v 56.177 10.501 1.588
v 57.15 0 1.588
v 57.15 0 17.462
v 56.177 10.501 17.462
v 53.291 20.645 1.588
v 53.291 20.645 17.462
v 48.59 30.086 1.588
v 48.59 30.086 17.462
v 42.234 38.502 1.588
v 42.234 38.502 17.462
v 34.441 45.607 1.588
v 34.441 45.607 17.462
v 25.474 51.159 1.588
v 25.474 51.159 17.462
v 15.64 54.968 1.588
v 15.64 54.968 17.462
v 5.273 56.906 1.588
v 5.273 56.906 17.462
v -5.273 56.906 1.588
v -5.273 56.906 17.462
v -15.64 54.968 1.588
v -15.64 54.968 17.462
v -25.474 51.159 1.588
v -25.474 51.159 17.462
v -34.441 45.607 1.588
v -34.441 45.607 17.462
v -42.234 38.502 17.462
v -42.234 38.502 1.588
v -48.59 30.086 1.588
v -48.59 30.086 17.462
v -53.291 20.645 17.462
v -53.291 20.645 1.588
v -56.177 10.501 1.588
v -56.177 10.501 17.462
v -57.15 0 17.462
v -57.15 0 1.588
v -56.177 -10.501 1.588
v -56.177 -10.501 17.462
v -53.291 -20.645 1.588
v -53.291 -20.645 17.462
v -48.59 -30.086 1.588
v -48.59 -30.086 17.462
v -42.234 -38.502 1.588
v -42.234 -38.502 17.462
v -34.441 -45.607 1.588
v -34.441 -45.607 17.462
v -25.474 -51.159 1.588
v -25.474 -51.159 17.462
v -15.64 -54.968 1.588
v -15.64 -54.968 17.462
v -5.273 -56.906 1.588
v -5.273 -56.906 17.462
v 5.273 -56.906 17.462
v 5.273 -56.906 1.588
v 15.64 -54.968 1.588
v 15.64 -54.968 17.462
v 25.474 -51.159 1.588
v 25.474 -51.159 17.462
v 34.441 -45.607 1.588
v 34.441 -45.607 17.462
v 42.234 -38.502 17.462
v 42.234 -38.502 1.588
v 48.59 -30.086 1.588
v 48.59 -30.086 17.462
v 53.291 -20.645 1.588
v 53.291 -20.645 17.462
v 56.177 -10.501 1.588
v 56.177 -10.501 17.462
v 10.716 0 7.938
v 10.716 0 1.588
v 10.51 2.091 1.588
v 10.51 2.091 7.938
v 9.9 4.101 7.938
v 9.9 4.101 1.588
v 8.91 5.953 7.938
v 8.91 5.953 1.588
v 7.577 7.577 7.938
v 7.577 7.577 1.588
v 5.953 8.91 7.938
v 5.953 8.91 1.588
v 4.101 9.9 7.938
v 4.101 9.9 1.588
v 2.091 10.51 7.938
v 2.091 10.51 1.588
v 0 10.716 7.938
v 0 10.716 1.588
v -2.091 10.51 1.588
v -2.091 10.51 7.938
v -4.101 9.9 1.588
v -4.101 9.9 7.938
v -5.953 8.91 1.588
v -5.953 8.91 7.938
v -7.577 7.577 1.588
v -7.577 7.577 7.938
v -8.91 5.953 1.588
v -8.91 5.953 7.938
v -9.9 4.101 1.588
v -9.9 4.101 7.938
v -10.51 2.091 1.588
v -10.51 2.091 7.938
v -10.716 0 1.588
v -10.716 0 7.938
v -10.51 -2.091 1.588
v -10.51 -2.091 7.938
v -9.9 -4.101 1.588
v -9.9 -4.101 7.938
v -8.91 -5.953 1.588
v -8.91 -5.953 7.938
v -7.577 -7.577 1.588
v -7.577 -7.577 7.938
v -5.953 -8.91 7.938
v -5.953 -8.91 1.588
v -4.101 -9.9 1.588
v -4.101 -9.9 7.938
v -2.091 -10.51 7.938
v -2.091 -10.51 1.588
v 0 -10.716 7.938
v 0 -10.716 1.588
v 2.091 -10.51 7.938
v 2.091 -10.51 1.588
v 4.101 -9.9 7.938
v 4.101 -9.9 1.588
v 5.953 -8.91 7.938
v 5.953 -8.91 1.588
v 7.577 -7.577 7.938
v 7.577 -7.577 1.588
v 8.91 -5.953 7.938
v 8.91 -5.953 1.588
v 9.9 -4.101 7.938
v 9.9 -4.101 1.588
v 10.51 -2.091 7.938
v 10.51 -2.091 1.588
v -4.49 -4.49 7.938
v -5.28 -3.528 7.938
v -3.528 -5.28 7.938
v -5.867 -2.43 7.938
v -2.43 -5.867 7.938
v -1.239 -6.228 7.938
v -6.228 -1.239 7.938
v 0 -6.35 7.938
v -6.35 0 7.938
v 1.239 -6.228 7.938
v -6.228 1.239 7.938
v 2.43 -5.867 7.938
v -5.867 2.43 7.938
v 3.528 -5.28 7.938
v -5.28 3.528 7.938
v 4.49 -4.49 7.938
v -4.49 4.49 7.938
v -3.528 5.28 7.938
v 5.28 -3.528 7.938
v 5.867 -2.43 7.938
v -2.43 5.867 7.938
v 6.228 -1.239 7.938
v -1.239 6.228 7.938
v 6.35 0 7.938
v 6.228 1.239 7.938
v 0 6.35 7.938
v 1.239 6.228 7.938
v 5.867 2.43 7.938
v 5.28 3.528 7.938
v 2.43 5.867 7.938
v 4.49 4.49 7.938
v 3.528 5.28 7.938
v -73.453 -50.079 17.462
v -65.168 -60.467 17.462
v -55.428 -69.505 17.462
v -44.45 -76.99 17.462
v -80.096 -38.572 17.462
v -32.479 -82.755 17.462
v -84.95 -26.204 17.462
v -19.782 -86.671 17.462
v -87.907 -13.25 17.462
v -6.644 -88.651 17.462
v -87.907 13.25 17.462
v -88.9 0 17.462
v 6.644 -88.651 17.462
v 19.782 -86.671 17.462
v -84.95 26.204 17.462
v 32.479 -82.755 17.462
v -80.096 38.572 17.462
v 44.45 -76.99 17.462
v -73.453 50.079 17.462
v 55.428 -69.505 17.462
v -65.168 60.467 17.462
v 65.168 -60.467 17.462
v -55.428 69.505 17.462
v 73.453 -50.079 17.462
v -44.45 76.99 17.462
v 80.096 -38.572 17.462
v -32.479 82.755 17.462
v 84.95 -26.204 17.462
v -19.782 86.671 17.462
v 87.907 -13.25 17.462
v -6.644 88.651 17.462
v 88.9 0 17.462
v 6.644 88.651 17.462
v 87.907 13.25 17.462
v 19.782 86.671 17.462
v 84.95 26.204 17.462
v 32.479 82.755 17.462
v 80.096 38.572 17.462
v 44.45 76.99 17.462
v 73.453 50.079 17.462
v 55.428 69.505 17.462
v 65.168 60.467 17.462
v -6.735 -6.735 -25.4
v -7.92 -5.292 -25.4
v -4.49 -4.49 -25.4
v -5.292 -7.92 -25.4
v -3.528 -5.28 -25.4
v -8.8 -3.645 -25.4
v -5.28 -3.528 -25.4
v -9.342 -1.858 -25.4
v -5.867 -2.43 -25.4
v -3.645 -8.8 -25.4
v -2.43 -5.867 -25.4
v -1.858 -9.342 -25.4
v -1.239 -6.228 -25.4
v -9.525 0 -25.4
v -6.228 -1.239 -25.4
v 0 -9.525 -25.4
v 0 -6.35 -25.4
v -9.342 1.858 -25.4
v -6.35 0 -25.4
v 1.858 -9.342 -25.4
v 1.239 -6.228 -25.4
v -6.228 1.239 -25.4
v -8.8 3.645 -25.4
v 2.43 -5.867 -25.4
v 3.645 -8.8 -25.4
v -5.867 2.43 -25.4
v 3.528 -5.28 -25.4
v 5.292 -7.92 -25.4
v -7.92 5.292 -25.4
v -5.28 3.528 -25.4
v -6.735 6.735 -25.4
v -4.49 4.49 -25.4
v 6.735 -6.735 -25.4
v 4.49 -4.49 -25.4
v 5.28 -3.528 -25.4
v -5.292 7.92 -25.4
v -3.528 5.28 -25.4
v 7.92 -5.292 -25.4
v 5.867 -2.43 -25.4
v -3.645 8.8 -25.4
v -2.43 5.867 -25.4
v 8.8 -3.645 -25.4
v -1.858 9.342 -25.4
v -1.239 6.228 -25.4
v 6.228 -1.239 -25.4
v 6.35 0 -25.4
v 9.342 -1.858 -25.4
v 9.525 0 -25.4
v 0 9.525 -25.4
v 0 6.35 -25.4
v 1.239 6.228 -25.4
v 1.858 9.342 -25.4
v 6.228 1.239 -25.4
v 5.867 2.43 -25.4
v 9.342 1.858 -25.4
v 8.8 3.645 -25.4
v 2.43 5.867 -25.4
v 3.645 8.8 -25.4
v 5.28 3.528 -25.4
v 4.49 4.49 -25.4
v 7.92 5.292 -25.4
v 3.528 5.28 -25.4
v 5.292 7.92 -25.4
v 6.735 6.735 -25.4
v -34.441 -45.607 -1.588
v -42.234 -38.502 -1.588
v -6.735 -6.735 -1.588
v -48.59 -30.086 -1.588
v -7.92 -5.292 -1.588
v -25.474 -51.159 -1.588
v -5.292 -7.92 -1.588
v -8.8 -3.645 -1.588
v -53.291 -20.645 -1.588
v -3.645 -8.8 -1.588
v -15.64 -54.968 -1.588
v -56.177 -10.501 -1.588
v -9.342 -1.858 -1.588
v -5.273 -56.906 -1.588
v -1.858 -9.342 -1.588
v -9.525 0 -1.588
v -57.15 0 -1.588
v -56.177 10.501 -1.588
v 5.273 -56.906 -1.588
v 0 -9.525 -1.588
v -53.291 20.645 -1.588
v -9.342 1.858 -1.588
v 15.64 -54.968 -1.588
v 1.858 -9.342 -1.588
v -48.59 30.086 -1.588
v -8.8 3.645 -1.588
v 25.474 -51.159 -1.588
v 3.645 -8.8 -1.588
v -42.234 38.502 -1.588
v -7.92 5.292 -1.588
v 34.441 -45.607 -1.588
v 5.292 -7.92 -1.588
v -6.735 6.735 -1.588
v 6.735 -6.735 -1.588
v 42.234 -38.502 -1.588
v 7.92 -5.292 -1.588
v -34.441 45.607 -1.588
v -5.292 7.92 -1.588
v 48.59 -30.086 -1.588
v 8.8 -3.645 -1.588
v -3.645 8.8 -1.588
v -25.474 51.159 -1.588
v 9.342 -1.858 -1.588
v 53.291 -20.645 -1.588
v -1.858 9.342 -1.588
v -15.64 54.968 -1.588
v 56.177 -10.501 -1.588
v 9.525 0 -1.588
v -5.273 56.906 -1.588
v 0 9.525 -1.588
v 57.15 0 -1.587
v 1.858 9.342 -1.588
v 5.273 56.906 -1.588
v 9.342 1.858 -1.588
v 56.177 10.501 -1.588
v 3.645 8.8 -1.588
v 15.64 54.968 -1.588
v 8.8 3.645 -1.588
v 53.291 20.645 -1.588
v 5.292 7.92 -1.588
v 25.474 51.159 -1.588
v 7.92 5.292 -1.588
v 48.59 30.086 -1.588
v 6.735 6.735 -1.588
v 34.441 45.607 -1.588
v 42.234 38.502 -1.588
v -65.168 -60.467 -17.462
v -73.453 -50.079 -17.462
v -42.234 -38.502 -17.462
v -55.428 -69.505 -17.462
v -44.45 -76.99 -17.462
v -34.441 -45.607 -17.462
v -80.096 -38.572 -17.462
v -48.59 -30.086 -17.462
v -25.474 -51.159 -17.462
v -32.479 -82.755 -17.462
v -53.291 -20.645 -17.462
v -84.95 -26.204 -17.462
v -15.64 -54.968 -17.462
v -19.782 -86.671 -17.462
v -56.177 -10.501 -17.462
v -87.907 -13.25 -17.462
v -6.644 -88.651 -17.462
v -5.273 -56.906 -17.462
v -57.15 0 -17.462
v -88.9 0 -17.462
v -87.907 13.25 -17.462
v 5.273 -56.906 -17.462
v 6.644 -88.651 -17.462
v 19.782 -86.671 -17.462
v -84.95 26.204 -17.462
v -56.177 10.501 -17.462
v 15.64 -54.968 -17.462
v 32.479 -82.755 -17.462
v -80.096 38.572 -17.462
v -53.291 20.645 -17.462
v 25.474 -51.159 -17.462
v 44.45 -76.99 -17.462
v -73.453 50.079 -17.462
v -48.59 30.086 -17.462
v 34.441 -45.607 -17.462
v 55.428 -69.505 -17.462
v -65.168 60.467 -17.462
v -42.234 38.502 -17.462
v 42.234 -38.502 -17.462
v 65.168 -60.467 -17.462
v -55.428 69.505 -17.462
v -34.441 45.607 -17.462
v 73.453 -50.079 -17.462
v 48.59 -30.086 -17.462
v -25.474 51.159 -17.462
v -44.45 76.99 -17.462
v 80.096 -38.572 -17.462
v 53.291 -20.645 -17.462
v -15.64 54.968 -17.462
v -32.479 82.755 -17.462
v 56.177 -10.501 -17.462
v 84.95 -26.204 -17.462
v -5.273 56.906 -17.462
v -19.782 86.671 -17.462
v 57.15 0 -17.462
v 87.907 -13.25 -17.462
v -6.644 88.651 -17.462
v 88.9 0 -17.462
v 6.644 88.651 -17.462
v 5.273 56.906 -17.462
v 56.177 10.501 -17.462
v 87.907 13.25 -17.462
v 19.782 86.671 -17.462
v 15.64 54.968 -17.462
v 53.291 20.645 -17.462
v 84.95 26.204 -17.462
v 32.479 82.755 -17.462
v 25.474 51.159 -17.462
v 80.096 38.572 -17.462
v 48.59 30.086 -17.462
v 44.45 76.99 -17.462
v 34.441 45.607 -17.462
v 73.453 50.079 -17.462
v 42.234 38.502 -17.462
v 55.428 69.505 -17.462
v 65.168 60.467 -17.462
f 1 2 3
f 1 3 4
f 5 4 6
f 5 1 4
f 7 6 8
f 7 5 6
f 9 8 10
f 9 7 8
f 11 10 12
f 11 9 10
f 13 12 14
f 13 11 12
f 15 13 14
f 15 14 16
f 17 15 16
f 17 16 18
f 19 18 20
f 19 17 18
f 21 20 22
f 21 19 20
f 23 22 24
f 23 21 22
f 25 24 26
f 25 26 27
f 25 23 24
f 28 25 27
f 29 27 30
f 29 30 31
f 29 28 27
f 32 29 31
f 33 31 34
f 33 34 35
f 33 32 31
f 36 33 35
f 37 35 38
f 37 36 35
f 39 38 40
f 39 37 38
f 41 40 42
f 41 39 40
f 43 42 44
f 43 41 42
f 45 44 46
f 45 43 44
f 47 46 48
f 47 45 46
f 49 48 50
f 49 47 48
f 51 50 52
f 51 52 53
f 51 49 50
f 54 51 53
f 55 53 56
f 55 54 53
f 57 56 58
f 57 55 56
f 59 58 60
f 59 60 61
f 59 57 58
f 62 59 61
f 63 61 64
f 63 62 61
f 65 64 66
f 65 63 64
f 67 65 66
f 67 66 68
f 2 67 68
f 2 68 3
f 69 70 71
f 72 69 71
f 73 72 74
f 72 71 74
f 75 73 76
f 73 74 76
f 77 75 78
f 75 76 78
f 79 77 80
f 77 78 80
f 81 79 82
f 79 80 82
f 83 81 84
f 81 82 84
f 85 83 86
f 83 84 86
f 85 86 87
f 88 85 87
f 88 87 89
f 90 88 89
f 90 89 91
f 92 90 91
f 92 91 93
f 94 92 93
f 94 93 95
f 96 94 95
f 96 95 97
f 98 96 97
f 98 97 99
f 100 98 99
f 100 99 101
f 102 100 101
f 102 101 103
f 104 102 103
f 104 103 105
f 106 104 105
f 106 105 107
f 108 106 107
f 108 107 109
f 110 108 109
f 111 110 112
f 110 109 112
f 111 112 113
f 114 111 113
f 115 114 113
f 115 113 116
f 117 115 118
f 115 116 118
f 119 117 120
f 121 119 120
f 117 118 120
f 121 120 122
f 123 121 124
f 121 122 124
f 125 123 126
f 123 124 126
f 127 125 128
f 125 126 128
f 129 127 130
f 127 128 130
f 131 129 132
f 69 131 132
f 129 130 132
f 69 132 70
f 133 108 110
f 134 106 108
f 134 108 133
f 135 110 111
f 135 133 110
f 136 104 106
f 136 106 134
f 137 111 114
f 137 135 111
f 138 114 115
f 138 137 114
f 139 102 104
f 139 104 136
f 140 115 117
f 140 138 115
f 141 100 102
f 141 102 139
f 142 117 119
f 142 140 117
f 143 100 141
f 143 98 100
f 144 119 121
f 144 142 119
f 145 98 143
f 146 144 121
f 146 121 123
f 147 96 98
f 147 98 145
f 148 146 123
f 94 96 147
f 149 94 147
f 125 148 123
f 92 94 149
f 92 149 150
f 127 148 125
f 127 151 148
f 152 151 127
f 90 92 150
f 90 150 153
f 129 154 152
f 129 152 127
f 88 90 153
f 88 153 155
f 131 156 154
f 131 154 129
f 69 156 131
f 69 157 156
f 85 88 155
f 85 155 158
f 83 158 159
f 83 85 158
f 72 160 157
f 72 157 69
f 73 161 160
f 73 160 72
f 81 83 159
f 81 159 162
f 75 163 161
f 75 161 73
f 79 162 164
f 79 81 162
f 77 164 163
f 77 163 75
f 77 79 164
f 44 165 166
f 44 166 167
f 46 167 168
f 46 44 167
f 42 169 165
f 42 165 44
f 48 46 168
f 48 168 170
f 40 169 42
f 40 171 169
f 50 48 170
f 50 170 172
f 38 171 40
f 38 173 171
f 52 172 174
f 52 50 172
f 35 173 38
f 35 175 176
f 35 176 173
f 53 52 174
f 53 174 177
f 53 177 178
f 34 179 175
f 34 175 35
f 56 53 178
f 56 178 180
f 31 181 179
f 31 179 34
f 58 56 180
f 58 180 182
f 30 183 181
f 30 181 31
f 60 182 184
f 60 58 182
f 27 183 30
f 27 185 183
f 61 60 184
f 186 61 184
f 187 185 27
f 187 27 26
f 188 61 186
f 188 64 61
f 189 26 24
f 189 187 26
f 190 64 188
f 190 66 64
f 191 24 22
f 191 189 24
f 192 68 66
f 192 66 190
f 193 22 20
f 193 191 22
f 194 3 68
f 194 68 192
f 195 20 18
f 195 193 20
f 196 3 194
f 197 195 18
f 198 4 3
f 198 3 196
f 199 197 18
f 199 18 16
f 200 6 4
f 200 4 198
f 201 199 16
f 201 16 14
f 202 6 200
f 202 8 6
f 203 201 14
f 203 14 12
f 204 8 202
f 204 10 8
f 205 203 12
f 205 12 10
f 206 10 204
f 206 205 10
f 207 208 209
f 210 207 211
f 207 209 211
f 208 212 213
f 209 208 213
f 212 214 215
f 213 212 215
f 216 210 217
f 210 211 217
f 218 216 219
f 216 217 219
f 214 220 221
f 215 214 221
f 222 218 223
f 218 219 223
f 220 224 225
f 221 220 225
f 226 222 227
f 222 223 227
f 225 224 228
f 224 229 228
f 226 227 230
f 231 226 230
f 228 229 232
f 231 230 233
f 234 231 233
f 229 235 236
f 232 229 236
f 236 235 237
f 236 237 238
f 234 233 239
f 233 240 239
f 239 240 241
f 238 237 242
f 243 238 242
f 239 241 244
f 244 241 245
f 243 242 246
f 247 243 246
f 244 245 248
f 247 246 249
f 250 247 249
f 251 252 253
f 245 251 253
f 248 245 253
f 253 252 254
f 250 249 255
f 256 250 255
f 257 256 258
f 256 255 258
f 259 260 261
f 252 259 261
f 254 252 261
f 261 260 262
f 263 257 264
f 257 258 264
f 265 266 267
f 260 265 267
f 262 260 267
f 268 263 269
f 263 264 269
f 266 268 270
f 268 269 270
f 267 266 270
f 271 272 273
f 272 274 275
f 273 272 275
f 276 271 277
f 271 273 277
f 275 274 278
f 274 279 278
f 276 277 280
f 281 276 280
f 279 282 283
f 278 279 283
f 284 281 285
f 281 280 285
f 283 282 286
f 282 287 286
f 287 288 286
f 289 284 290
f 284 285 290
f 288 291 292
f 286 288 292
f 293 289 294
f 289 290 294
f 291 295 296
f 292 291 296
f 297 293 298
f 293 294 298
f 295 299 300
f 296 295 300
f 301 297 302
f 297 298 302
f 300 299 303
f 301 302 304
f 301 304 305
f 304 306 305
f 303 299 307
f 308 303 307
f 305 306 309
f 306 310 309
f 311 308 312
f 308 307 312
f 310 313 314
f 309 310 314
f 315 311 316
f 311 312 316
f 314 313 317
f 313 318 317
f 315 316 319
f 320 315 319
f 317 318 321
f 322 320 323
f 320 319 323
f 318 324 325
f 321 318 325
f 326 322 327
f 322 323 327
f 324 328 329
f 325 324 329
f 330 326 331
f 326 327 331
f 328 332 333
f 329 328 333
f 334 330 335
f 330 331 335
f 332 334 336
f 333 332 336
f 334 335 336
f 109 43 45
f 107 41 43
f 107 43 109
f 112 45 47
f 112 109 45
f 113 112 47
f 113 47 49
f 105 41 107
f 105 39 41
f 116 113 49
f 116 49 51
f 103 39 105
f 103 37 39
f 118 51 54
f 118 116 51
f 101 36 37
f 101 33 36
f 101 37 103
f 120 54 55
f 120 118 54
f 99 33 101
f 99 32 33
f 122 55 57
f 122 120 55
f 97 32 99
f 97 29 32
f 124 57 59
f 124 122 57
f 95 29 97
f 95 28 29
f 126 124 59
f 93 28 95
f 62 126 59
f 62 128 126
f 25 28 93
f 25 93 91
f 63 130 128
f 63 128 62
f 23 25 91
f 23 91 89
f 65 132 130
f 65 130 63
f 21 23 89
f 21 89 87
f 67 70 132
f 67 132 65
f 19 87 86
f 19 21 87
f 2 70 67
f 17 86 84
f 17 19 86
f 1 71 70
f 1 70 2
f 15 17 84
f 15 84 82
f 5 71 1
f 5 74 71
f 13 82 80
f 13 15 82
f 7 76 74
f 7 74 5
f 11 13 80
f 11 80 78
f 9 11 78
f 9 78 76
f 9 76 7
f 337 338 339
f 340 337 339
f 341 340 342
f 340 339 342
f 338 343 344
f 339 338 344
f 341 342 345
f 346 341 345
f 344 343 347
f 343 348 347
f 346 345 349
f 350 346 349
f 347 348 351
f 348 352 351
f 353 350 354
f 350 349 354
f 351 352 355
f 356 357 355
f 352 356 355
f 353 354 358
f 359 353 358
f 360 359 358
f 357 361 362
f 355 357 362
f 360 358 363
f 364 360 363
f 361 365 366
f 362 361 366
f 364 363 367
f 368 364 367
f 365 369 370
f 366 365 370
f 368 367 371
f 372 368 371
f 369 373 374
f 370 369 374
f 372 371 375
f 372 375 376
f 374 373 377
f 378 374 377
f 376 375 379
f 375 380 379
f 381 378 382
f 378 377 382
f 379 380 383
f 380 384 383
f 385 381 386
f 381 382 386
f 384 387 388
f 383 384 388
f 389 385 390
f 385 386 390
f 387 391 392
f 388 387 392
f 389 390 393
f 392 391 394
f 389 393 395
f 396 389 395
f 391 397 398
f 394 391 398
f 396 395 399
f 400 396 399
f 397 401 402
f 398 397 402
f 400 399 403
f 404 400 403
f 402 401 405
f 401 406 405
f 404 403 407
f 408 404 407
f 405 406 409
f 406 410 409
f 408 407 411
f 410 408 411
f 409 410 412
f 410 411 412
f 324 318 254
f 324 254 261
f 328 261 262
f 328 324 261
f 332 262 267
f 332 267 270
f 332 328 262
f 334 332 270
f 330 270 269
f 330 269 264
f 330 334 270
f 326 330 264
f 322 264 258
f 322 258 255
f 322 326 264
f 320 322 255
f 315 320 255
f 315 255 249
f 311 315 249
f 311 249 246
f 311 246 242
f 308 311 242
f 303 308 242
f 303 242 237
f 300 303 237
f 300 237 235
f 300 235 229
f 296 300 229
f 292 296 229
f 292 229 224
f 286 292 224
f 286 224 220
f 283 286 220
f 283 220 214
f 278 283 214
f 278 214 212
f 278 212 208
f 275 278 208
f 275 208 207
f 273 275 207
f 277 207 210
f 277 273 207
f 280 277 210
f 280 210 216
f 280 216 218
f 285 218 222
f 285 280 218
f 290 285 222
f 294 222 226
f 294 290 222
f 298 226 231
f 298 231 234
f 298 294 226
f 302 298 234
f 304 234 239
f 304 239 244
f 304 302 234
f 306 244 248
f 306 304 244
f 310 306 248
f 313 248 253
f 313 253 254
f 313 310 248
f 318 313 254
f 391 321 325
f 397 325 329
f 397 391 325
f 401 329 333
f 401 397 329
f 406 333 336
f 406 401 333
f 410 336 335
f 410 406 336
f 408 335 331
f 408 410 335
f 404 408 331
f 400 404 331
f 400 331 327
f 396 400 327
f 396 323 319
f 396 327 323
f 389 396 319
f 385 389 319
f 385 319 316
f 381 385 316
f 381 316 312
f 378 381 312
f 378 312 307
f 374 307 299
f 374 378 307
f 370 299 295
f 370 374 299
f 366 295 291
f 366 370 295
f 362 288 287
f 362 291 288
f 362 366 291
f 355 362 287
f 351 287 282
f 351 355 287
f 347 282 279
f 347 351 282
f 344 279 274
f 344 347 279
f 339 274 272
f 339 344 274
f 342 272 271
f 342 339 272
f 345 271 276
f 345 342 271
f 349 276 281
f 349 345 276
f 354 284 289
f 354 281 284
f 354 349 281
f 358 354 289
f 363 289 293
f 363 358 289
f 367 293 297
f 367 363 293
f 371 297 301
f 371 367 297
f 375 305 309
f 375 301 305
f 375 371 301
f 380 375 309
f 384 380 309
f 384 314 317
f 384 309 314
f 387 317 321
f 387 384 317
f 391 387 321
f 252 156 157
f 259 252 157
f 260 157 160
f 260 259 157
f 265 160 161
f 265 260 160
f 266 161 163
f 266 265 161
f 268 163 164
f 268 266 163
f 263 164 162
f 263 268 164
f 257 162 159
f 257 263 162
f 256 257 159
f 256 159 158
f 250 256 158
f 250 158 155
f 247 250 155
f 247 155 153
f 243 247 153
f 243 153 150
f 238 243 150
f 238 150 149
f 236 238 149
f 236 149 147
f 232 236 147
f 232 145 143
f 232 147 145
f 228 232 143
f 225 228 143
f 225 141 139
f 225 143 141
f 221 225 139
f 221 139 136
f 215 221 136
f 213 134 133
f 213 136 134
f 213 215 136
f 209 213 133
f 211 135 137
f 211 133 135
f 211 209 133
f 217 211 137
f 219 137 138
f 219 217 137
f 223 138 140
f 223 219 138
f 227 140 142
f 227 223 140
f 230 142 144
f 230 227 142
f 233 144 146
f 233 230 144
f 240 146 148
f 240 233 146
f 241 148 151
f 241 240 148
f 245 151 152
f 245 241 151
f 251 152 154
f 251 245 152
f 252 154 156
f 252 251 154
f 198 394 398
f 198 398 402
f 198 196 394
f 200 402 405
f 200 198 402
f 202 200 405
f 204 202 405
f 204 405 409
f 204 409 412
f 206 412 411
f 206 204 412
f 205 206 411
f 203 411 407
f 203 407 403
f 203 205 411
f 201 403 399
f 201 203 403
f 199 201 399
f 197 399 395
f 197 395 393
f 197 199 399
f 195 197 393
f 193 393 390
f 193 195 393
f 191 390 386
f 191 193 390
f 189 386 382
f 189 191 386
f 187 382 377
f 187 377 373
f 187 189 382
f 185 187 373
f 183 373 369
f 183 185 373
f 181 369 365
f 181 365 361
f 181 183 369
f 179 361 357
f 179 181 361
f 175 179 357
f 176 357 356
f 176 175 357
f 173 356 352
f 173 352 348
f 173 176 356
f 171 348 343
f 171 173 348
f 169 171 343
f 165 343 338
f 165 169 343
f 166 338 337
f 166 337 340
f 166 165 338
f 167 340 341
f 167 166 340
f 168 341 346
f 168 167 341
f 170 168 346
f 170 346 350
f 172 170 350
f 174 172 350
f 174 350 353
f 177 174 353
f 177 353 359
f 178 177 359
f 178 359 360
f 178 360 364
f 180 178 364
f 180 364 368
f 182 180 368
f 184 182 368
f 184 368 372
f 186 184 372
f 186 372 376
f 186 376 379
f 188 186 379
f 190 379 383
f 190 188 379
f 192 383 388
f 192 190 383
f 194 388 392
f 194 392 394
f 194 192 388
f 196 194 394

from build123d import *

# Parameters (mm, degrees)
SKETCH1_R               = 88.9
SKETCH1_R_2             = 69.85
BOSS_EXTRUDE1_DEPTH     = 17.4625
SKETCH2_R               = 69.85
BOSS_EXTRUDE2_DEPTH     = 1.5875
SKETCH3_R               = 69.85
SKETCH3_R_2             = 57.15
BOSS_EXTRUDE3_DEPTH     = 17.4625
SKETCH4_R               = 10.715625
BOSS_EXTRUDE4_DEPTH     = 7.9375
SKETCH5_R               = 9.525
BOSS_EXTRUDE5_DEPTH     = 25.4
CUT_EXTRUDE1_DEPTH      = 129.263712717
CUT_EXTRUDE1_DEPTH_BACK = 129.263712717
SKETCH6_R               = 6.35


with BuildPart() as part:
    # Sketch1 → Boss-Extrude1 (new, symmetric)
    with BuildSketch(Plane.XY):
        Circle(SKETCH1_R)
        Circle(SKETCH1_R_2, mode=Mode.SUBTRACT)
    extrude(amount=BOSS_EXTRUDE1_DEPTH, both=True)

    # Sketch2 → Boss-Extrude2 (add, symmetric)
    with BuildSketch(Plane.XY):
        Circle(SKETCH2_R)
    extrude(amount=BOSS_EXTRUDE2_DEPTH, both=True)



with BuildPart() as body_2:
    # Sketch3 → Boss-Extrude3 (new, symmetric)
    with BuildSketch(Plane.XY):
        Circle(SKETCH3_R)
        Circle(SKETCH3_R_2, mode=Mode.SUBTRACT)
    extrude(amount=BOSS_EXTRUDE3_DEPTH, both=True)


with BuildPart() as part_1:
    add(part.part)

    add(body_2.part)  # Boss-Extrude4 merges body 2
    # Sketch4 → Boss-Extrude4 (add)
    with BuildSketch(Plane.XY):
        Circle(SKETCH4_R)
    extrude(amount=BOSS_EXTRUDE4_DEPTH)

    # Sketch5 → Boss-Extrude5 (add)
    with BuildSketch(Plane.XY):
        Circle(SKETCH5_R)
    extrude(amount=-BOSS_EXTRUDE5_DEPTH)

    # Sketch6 → Cut-Extrude1 (cut, two sides: drawn at the far end of the back side and taken through both)
    with BuildSketch(Plane.XY.offset(-CUT_EXTRUDE1_DEPTH_BACK)):
        Circle(SKETCH6_R)
    extrude(amount=CUT_EXTRUDE1_DEPTH + CUT_EXTRUDE1_DEPTH_BACK, mode=Mode.SUBTRACT)


solid = part_1.part
